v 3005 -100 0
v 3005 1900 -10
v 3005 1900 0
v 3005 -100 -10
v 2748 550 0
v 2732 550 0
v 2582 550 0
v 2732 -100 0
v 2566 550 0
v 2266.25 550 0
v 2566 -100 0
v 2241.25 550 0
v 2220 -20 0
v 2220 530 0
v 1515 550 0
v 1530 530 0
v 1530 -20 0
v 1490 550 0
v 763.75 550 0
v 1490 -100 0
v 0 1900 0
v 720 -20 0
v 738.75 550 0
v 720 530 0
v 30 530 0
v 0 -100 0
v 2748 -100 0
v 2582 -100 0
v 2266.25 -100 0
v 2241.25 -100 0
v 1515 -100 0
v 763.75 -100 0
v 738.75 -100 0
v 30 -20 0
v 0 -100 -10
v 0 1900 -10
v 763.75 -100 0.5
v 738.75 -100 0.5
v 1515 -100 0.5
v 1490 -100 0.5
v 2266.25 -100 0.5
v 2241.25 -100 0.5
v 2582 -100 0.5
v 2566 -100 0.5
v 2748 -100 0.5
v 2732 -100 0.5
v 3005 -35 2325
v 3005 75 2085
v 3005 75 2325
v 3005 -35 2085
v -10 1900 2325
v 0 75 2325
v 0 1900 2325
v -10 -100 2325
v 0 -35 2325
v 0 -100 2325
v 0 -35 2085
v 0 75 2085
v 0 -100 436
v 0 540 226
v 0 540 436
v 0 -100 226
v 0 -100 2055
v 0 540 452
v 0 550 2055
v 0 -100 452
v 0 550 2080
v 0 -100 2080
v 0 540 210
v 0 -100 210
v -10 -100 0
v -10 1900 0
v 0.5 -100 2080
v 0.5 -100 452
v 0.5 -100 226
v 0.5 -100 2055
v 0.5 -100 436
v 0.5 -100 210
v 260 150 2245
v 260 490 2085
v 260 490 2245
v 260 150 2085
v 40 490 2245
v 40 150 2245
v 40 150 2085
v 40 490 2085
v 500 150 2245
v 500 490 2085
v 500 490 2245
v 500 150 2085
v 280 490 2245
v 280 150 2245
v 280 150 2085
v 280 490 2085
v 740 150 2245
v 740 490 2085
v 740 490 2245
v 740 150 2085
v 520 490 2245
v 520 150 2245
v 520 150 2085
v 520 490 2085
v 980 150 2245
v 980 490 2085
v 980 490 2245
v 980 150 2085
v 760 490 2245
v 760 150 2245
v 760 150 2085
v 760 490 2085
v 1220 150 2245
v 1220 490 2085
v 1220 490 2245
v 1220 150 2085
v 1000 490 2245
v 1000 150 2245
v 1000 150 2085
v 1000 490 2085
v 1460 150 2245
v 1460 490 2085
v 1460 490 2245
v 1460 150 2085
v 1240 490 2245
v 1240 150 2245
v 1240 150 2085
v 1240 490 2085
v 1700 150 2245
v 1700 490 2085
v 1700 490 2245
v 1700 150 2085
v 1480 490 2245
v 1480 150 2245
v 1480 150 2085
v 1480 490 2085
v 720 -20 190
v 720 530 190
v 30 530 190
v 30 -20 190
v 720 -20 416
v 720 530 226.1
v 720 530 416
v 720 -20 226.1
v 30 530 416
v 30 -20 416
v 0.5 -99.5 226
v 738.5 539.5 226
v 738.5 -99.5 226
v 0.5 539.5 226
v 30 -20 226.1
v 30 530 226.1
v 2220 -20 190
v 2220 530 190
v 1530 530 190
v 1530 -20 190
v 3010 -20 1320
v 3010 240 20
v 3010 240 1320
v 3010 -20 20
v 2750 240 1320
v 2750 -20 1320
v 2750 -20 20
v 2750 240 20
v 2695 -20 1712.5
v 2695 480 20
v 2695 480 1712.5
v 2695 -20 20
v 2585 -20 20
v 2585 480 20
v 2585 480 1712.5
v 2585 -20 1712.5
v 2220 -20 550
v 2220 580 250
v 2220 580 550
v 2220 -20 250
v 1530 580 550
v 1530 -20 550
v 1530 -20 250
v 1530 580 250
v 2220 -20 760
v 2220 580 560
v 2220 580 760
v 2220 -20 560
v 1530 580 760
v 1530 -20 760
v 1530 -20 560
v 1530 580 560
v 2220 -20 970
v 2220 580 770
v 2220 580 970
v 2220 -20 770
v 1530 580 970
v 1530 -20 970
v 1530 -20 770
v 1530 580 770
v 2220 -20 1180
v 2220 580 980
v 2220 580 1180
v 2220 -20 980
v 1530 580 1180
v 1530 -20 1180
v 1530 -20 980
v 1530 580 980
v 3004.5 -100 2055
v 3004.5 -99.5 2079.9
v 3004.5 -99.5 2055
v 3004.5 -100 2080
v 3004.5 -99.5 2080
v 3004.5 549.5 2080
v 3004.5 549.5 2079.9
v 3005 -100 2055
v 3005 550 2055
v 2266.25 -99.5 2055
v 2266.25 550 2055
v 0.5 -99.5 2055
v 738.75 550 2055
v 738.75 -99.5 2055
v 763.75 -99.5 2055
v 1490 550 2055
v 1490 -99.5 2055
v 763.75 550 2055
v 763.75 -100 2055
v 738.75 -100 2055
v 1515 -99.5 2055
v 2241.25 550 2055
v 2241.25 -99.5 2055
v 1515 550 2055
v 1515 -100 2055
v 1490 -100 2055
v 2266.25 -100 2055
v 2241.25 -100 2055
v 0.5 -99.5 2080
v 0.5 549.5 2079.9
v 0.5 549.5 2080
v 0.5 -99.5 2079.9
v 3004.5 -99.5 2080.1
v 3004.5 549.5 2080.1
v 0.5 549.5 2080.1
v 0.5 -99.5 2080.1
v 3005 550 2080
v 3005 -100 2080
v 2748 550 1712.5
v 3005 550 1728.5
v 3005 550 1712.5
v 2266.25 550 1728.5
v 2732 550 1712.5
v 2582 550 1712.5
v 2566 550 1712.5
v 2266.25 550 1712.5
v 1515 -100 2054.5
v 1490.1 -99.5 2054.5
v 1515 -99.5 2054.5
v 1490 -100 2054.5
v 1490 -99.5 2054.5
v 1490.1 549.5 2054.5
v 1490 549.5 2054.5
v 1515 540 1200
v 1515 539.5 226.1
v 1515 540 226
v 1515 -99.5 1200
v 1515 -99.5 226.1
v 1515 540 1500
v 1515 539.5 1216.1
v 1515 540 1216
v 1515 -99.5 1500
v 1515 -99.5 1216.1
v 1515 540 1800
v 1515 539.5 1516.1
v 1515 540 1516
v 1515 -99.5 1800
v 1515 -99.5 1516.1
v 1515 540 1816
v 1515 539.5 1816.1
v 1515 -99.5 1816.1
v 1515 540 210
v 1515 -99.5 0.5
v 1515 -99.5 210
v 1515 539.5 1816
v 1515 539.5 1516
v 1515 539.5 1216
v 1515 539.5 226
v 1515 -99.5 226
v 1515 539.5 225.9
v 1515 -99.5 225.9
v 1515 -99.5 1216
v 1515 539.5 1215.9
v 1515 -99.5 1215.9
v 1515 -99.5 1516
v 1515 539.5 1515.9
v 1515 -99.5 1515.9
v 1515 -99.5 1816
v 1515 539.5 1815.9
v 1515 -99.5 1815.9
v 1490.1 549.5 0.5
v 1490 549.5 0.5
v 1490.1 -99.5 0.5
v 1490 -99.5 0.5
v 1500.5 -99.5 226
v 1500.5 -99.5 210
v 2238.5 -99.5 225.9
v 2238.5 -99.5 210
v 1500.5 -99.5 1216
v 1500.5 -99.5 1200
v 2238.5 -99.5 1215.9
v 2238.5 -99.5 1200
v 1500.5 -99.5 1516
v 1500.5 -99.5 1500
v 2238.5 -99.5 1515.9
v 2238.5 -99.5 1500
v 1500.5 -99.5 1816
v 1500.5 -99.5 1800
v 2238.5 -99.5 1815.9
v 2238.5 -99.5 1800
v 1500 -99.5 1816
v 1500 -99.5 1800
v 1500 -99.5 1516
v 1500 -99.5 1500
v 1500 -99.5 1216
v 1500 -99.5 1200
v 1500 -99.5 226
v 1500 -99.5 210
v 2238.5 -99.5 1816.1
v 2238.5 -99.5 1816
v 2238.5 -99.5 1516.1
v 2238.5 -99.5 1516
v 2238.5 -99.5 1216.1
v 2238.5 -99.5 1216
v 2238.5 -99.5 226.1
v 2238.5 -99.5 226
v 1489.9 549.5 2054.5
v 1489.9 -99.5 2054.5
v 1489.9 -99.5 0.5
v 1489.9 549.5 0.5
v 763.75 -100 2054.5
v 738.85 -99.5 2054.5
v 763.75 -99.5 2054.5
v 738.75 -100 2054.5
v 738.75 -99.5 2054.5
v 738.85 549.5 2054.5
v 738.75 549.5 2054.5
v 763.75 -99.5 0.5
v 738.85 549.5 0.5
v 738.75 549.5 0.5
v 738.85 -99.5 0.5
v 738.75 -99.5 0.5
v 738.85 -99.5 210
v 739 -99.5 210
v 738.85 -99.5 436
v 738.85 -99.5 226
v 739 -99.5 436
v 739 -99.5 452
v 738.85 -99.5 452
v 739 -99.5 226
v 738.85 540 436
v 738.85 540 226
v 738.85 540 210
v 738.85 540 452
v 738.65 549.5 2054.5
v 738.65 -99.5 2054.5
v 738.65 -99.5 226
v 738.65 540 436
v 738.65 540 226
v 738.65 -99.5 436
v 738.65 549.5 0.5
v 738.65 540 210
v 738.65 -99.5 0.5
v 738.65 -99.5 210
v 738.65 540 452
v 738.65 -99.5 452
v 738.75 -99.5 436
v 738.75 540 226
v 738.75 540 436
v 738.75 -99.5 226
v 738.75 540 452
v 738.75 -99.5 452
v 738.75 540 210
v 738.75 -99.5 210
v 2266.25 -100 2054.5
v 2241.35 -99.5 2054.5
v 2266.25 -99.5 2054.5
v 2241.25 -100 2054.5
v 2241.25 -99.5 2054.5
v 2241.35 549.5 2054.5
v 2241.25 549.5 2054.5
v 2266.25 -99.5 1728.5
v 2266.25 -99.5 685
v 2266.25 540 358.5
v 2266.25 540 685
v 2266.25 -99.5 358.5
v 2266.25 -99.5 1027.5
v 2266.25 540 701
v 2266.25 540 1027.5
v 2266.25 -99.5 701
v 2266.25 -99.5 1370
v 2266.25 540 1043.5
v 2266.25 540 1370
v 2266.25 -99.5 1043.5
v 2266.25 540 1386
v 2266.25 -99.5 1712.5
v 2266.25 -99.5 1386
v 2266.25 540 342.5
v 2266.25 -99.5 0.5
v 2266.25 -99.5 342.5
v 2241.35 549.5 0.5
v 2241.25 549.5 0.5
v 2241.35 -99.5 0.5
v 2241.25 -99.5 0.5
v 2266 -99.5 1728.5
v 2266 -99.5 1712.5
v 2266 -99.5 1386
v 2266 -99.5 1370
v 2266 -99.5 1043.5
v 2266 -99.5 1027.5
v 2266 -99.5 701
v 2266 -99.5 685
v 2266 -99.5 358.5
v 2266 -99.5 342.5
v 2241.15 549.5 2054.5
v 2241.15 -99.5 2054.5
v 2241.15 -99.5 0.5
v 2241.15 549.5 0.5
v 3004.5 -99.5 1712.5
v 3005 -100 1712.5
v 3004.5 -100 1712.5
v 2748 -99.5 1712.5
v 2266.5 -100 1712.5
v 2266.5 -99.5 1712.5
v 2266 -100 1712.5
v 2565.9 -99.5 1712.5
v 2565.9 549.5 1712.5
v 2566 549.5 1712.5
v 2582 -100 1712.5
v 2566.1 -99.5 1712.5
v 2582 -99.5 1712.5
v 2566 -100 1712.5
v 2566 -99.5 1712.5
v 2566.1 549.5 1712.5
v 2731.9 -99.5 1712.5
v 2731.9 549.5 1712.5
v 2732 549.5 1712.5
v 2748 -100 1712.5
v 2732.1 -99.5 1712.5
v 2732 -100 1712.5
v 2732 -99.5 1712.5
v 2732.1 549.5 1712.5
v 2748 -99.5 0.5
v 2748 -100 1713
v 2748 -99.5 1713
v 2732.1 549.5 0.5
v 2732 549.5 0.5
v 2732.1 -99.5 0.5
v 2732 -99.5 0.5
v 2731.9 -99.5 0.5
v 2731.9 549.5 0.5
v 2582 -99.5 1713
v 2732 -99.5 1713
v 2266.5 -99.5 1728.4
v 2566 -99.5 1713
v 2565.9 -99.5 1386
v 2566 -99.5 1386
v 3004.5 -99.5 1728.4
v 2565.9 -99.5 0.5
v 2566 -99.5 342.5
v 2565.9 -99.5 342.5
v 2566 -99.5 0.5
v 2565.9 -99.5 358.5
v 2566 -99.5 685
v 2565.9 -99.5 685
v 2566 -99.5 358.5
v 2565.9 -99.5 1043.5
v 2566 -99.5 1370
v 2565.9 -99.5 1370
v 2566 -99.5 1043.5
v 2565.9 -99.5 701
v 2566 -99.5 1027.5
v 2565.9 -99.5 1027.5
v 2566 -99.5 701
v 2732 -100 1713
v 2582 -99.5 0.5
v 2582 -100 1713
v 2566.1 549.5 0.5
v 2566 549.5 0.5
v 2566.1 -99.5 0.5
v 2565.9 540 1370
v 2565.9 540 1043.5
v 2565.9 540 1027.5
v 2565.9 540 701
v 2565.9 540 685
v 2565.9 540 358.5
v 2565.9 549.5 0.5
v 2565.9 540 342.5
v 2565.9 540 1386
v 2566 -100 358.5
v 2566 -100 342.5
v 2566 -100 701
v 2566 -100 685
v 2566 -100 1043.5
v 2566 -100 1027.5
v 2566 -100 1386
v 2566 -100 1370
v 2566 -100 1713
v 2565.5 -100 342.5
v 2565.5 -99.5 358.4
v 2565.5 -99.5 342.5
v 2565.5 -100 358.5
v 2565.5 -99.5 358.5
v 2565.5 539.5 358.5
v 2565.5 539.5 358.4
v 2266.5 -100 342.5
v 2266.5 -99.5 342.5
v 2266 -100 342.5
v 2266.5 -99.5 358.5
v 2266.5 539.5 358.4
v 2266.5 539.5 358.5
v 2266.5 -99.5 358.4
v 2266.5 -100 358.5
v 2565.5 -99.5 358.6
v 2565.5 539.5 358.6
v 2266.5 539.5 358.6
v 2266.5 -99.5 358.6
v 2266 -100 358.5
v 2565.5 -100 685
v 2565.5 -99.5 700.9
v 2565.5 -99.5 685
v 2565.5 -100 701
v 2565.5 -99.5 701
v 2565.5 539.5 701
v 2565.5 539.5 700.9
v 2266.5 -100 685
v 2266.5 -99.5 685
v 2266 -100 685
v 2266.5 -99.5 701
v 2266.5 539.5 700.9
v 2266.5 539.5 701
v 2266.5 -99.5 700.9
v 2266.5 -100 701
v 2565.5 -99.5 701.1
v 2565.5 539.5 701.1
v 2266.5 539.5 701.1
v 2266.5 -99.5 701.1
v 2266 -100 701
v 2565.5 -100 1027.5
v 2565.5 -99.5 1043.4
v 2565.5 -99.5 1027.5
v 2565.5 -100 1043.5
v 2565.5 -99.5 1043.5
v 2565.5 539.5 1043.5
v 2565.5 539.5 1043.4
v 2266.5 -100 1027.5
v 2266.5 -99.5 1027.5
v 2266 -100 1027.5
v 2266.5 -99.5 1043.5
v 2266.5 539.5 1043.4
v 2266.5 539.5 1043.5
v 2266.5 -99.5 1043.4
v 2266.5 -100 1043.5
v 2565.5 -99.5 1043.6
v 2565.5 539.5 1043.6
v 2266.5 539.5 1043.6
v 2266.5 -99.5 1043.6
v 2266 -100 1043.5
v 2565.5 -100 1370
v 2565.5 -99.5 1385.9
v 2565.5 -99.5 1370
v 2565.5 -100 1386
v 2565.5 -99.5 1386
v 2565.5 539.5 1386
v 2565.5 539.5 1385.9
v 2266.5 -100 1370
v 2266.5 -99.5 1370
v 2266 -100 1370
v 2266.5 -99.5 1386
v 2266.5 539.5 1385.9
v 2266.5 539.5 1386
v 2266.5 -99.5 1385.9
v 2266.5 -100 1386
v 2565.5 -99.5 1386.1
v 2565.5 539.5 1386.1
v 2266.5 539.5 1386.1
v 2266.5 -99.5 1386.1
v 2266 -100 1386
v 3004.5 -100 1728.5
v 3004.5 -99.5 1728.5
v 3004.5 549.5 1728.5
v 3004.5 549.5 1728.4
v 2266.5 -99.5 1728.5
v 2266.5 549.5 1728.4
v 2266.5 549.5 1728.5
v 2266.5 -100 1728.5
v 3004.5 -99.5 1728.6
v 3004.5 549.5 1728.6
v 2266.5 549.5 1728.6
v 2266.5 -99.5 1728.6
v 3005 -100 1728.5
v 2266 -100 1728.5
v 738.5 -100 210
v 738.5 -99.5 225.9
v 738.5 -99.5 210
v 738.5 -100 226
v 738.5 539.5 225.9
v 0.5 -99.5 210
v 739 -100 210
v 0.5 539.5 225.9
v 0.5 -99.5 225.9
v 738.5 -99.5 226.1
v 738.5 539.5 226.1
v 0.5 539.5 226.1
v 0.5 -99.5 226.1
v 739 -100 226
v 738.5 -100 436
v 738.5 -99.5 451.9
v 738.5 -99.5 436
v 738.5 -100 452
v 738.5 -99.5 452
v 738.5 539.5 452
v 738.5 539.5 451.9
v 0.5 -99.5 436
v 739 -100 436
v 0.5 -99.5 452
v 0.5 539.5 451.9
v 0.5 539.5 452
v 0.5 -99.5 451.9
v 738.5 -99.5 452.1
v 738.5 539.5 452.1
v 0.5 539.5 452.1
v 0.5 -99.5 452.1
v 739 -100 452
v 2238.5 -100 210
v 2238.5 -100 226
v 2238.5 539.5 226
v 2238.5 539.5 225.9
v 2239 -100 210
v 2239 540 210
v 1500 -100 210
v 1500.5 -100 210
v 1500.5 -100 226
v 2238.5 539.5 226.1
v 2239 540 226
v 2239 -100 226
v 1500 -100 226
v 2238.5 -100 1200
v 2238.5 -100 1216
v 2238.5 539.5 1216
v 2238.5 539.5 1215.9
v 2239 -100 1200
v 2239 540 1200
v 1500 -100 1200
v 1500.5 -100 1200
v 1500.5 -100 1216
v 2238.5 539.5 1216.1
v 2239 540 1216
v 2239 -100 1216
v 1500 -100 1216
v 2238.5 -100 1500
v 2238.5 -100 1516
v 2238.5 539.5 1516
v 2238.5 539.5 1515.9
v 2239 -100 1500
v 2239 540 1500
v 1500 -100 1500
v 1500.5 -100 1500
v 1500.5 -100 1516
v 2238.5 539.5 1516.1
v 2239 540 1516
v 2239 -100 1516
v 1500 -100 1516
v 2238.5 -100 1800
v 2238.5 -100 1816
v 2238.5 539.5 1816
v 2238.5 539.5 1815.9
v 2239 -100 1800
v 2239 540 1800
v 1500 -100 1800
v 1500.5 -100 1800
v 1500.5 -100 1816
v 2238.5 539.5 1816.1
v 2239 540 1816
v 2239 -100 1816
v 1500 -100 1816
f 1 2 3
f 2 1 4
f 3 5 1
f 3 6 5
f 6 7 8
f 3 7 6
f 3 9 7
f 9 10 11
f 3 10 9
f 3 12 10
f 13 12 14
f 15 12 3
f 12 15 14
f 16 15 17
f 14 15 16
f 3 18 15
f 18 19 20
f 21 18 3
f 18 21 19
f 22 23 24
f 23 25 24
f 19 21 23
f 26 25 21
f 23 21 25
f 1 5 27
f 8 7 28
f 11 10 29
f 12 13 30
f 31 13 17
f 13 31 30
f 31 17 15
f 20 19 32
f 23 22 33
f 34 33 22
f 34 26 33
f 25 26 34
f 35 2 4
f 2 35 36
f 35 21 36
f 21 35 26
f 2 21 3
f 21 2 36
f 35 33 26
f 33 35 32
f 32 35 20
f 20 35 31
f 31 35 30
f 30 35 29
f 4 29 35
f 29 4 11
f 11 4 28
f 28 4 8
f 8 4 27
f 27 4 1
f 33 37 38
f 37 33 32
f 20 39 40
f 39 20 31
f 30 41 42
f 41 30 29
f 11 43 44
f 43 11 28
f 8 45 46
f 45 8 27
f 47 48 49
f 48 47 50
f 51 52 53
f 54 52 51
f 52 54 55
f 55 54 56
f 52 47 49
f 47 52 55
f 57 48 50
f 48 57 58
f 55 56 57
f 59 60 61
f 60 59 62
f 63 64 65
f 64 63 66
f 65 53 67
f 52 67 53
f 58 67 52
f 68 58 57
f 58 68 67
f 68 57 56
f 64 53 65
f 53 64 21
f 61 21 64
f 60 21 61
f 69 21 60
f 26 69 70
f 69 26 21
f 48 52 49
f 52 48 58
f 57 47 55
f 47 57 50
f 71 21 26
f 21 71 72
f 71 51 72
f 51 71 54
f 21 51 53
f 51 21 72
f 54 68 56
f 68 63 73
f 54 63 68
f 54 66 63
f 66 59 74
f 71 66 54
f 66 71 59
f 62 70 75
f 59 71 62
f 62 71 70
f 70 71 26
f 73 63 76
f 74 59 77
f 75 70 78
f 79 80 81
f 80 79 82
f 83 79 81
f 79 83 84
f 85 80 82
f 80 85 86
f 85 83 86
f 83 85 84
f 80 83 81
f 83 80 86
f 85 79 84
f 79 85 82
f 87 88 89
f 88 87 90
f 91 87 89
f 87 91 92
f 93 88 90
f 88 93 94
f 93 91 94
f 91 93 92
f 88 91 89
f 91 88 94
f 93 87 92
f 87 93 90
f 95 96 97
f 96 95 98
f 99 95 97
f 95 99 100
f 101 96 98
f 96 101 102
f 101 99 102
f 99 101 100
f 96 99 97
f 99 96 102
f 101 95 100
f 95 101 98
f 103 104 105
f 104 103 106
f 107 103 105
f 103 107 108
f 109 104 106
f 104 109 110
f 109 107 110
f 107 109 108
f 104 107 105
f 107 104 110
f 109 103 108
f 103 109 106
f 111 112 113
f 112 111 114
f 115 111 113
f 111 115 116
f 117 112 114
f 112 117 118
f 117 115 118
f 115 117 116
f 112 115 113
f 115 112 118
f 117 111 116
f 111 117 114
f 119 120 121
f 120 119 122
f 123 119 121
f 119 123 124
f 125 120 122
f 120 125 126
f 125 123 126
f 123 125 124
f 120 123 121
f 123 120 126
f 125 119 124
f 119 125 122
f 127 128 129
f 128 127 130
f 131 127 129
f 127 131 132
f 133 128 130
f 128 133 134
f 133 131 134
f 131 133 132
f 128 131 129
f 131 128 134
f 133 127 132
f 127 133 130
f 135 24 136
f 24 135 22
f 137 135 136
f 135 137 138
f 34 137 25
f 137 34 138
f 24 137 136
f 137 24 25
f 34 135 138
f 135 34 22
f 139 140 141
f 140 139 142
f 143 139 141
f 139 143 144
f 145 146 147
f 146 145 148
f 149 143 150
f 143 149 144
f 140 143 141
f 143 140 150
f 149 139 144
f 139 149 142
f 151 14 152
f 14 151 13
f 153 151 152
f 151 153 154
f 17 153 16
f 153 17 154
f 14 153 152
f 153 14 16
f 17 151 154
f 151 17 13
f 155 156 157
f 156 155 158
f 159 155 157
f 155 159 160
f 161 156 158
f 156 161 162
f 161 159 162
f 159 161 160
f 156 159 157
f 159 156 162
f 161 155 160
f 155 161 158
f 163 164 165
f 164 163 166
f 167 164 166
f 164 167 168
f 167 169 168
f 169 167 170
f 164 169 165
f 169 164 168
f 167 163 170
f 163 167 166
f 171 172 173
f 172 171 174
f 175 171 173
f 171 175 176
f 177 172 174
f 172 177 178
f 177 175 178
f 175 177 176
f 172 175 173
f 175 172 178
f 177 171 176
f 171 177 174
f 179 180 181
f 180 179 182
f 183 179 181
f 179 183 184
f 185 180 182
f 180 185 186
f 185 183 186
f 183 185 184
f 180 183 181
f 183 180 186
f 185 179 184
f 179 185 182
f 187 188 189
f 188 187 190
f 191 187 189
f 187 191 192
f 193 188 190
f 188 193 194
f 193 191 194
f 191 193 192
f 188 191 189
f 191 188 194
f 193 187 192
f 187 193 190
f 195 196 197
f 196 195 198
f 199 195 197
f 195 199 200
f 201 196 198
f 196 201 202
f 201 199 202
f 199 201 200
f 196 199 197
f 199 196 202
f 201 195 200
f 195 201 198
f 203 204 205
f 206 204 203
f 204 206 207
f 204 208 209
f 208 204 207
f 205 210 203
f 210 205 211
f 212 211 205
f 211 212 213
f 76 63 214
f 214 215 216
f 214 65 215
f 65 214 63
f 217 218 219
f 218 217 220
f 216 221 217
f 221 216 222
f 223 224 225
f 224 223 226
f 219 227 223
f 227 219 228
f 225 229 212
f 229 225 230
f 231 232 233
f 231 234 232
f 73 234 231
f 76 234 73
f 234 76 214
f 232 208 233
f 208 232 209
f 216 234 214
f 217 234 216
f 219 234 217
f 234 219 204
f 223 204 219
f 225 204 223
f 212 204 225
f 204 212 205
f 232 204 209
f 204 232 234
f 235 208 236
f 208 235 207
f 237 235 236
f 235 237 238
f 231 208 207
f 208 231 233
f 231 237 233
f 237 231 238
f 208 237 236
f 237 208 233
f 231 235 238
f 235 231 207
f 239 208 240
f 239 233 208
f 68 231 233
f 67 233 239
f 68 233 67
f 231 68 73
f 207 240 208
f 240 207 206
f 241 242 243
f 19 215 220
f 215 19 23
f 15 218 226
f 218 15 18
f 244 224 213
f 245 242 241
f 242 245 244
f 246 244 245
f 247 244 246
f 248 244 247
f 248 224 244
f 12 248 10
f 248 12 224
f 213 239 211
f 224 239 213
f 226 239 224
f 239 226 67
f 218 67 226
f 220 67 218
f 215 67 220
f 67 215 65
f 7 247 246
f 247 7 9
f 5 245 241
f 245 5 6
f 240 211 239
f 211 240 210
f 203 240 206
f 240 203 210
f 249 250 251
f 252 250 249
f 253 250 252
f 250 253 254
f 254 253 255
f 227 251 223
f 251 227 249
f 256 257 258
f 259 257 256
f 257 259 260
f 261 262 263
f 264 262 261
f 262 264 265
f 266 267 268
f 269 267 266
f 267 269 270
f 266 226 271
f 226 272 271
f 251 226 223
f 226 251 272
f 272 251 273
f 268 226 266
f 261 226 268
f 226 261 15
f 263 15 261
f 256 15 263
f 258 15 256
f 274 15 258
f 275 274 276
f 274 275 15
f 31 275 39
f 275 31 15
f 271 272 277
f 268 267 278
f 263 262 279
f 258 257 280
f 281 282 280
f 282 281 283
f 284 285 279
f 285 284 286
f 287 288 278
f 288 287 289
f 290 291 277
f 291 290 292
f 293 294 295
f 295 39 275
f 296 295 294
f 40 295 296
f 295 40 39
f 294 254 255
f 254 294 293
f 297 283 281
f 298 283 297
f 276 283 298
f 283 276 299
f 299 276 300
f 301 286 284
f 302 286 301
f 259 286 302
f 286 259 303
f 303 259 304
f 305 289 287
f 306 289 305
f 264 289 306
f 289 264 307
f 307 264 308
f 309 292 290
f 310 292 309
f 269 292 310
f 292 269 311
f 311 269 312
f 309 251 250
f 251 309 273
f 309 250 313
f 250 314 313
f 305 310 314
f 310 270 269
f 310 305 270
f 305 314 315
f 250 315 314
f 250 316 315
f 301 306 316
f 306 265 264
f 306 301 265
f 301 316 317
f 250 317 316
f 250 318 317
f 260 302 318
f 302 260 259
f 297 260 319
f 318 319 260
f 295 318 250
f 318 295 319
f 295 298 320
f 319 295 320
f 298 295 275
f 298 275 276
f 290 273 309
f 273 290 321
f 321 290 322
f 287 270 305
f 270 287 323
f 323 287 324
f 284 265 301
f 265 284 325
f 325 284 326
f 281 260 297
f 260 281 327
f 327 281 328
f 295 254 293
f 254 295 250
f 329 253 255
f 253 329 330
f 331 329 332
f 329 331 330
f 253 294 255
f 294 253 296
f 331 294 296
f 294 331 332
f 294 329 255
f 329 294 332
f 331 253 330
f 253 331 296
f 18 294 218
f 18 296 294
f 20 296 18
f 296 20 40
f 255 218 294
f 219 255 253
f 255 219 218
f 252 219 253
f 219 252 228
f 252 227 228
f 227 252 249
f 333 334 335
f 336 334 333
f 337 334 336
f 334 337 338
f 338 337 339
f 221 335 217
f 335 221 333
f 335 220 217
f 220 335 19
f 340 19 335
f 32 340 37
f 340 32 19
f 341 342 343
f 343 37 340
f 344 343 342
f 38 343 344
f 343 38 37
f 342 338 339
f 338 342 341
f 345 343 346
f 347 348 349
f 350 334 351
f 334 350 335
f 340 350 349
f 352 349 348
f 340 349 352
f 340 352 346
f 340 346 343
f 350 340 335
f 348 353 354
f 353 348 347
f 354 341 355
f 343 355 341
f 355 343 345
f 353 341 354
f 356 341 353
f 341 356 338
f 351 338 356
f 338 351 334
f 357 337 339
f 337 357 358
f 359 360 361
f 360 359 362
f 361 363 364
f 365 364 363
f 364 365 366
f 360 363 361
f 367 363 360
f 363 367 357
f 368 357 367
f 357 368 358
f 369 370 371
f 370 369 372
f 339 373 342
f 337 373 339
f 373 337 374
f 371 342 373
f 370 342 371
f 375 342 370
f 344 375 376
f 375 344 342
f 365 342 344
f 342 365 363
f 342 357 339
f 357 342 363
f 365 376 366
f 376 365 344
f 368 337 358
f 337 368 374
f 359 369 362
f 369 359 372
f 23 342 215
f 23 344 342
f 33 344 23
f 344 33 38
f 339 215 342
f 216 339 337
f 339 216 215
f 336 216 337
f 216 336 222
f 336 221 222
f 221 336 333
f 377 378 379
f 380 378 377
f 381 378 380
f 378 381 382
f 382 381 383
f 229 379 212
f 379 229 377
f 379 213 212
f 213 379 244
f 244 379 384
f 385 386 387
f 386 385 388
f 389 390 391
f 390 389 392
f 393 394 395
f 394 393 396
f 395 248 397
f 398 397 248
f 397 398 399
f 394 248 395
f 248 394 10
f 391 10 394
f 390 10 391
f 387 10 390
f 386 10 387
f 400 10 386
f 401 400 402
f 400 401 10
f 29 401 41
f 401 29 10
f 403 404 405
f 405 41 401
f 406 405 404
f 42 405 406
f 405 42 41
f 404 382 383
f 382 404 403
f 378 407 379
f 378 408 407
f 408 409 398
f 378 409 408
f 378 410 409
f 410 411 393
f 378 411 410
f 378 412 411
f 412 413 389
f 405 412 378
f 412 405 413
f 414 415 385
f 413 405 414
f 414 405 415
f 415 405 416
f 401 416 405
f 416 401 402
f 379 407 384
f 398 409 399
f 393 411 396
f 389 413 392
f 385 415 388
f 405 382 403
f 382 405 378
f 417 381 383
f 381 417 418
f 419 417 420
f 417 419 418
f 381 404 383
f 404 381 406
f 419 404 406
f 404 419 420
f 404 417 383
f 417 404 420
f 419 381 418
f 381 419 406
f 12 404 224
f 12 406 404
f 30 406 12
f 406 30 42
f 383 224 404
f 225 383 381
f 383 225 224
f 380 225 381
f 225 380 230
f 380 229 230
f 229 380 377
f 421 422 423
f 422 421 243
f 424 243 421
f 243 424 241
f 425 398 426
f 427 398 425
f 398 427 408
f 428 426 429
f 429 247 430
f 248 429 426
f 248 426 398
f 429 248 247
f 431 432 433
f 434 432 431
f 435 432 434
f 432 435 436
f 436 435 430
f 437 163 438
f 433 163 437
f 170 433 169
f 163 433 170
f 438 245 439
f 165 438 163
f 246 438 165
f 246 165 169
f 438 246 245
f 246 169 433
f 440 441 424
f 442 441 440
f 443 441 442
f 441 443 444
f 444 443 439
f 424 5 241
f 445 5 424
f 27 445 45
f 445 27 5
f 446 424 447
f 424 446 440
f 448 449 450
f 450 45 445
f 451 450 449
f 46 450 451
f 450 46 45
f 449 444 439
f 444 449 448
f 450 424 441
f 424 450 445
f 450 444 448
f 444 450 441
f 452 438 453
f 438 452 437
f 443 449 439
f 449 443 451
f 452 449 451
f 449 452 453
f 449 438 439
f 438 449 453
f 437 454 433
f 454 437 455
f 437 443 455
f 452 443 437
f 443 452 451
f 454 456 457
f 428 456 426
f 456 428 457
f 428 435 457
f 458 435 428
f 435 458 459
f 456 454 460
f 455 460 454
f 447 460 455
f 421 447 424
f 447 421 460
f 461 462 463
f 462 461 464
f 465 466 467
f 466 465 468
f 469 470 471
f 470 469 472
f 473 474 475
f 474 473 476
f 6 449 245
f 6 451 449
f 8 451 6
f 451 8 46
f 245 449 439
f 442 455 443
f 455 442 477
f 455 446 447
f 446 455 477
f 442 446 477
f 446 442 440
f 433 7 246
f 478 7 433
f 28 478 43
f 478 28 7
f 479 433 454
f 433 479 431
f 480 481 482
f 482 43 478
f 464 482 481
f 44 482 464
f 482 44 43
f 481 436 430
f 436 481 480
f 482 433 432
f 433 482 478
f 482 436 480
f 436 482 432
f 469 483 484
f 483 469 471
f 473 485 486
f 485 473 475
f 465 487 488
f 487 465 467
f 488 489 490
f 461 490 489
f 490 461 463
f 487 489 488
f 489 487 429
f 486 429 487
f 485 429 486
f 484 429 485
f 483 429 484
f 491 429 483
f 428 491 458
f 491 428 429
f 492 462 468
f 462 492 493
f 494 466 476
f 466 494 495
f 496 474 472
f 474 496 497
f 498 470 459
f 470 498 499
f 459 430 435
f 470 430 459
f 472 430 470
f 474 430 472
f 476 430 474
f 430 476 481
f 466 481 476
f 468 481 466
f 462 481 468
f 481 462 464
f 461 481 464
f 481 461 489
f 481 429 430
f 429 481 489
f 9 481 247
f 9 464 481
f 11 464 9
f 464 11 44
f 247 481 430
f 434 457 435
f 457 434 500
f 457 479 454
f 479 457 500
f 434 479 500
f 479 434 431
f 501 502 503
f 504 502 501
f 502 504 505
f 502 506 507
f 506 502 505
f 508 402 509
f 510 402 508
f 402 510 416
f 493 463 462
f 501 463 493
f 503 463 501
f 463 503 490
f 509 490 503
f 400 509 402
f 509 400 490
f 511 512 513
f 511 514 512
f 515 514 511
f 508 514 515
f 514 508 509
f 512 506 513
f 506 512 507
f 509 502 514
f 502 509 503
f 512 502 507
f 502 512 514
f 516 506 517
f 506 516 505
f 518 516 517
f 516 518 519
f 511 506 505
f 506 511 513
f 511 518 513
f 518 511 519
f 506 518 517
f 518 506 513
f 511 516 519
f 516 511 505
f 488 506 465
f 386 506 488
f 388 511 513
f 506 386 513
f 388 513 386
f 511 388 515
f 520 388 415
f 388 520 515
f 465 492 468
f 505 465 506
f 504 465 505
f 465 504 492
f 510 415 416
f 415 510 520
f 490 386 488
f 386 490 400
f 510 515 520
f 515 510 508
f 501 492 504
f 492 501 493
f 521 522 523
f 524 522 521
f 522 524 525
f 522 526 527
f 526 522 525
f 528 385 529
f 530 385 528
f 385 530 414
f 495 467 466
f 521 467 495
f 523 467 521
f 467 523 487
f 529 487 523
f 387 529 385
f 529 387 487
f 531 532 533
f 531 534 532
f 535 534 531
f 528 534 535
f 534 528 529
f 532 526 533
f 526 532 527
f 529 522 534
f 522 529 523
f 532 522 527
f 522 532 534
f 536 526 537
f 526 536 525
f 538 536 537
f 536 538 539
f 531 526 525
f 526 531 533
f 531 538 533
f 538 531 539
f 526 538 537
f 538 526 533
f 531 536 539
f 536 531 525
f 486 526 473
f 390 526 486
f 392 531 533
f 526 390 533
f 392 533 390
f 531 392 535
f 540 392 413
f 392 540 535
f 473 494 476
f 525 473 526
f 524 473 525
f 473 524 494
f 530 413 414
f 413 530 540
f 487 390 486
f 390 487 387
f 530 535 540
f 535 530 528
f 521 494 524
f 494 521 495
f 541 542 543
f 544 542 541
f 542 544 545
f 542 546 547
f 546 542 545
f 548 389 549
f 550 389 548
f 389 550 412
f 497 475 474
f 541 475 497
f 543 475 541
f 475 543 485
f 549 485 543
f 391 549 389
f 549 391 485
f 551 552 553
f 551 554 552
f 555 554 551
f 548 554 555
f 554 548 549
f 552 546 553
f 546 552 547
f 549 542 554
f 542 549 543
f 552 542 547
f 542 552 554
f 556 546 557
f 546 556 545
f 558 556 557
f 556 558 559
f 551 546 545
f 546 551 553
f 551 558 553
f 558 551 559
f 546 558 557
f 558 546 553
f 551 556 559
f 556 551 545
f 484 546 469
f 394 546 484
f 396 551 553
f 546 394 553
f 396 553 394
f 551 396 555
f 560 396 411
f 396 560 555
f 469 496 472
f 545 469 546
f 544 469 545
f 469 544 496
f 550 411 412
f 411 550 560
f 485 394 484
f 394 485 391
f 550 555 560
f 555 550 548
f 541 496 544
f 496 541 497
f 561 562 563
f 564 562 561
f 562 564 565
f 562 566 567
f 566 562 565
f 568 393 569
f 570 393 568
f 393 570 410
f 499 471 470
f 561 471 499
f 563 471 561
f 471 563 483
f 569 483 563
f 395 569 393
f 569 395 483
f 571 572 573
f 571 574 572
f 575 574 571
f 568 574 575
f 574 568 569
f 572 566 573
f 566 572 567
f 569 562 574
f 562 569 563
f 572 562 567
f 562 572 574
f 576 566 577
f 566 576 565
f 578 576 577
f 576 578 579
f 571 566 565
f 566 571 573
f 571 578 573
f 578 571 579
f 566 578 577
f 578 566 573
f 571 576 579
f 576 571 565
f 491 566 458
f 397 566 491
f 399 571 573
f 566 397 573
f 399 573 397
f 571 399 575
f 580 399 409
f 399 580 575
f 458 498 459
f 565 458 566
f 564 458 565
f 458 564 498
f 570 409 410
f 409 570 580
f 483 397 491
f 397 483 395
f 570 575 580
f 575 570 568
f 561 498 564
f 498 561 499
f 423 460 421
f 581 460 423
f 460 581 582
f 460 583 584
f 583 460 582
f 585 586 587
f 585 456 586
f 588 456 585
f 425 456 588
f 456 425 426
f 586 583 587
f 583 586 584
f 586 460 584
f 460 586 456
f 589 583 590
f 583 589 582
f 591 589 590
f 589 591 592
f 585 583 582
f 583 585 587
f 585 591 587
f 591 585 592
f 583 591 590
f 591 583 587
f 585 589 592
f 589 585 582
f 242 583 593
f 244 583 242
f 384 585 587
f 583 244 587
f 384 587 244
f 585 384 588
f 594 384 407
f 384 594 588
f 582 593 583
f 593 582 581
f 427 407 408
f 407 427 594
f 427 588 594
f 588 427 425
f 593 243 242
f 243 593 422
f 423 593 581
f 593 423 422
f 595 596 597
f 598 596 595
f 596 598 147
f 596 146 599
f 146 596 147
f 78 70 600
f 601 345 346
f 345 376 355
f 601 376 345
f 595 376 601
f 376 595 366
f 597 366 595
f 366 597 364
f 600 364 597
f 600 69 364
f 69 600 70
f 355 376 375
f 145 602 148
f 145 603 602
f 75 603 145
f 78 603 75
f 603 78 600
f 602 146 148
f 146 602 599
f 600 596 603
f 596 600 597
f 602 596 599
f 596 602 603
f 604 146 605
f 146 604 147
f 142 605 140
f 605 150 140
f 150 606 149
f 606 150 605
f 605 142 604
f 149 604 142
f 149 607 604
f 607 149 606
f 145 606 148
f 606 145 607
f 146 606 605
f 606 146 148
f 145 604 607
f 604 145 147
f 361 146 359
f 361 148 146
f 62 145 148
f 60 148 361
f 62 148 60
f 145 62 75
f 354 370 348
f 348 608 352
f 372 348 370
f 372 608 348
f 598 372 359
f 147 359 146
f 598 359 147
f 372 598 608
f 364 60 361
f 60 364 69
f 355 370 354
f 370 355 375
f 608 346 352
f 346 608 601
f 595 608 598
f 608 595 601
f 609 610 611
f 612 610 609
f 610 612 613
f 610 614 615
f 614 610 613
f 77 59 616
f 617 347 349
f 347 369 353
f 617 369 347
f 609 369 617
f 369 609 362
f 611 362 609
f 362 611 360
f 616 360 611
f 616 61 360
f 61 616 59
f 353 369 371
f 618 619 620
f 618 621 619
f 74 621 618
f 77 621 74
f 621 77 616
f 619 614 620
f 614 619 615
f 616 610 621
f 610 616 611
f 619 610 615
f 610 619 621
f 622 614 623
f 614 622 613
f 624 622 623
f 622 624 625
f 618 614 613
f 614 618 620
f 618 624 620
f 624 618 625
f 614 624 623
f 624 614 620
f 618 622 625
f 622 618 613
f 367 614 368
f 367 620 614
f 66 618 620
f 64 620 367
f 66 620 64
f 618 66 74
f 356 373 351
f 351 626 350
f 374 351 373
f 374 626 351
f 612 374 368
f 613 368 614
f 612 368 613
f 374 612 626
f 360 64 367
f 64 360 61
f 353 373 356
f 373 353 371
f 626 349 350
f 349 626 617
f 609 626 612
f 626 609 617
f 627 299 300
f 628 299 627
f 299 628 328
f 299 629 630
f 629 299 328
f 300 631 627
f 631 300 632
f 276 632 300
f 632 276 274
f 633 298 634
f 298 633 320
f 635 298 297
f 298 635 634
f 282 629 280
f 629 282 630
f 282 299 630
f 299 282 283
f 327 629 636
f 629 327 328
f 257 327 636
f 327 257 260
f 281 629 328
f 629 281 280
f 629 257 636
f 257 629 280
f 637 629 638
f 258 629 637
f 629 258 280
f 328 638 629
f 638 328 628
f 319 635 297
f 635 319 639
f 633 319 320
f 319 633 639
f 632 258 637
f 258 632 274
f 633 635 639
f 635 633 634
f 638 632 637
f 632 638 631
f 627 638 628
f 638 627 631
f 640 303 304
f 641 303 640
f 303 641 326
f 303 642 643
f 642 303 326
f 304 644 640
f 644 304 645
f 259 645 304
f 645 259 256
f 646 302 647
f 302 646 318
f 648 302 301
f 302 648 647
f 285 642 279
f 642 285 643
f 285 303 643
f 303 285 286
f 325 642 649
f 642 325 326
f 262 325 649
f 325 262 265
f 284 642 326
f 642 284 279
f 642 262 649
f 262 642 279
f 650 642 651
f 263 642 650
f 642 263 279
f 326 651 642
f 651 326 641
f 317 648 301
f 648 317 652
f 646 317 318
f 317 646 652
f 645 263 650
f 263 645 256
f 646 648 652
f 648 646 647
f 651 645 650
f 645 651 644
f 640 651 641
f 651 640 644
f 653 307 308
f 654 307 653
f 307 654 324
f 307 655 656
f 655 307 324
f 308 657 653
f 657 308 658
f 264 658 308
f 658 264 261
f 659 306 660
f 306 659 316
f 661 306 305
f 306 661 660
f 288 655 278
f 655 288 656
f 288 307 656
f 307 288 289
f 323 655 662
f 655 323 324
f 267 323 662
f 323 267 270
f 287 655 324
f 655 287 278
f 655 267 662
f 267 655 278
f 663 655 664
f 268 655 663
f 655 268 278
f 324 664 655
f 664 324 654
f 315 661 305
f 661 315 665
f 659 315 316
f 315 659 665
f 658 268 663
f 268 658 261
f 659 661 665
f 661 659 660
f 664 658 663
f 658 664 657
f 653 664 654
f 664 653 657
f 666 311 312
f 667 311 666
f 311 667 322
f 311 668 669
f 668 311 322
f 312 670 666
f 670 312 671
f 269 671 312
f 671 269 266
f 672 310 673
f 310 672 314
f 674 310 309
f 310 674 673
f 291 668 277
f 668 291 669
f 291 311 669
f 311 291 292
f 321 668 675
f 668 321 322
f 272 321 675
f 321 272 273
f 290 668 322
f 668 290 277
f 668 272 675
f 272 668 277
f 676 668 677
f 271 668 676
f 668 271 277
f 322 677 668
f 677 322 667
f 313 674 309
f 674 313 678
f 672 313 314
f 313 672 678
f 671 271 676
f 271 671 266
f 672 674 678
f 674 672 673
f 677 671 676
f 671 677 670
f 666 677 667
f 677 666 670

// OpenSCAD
ROOM_WITH = 3005;
ROOM_HEIGTH = 2325;
BACK_OFFSET = 100;
COUPE_DEPTH = 550;
RACK_HEIGHT = 2085-25-5;

//cube([150, 50, 16]);

room();
boxes();
boxes2();

translate([0,-BACK_OFFSET,RACK_HEIGHT]) sheet(ROOM_WITH, COUPE_DEPTH+BACK_OFFSET, 25, [true, true, 0, true]);
racks();

translate([ROOM_WITH-439,0,0]) shelfs(300, 540);
translate([ROOM_WITH,0,0])  translate([-739,-BACK_OFFSET,RACK_HEIGHT*5/6]) sheet(739, 550+BACK_OFFSET, 16, [true, true, 0, true]);

translate([739,0,0]) shelfs2(739, 540);



module racks() {
    translate([ROOM_WITH*0.5 + 12.5,-BACK_OFFSET,0]) rotate([0,-90,0]) sheet(RACK_HEIGHT, COUPE_DEPTH+BACK_OFFSET, 25, [true, true, 0, true]);
    translate([ROOM_WITH*0.25 + 12.5,-BACK_OFFSET,0]) rotate([0,-90,0]) sheet(RACK_HEIGHT, COUPE_DEPTH+BACK_OFFSET, 25, [true, true, 0, true]);
    translate([ROOM_WITH*0.75 + 12.5,-BACK_OFFSET,0]) rotate([0,-90,0]) sheet(RACK_HEIGHT, COUPE_DEPTH+BACK_OFFSET, 25, [true, true, 0, true]);
    translate([ROOM_WITH-439+16+150+16,-BACK_OFFSET,0]) rotate([0,-90,0]) sheet(1713, COUPE_DEPTH+BACK_OFFSET, 16, [true, true, 0, true]);
    translate([ROOM_WITH-439+16,-BACK_OFFSET,0]) rotate([0,-90,0]) sheet(1713, COUPE_DEPTH+BACK_OFFSET, 16, [true, true, 0, true]);
}

module shelfs(width, depth) {
    translate([-width,-BACK_OFFSET,RACK_HEIGHT*1/6]) sheet(width, depth+BACK_OFFSET, 16, [true, true, 0, true]);
    translate([-width,-BACK_OFFSET,RACK_HEIGHT*2/6]) sheet(width, depth+BACK_OFFSET, 16, [true, true, 0, true]);
    translate([-width,-BACK_OFFSET,RACK_HEIGHT*3/6]) sheet(width, depth+BACK_OFFSET, 16, [true, true, 0, true]);
    translate([-width,-BACK_OFFSET,RACK_HEIGHT*4/6]) sheet(width, depth+BACK_OFFSET, 16, [true, true, 0, true]);
}

module shelfs2(width, depth) {
    translate([-width,-BACK_OFFSET,210]) sheet(width, depth+BACK_OFFSET, 16, [true, true, 0, true]);
    translate([-width,-BACK_OFFSET,210+16+190+20]) sheet(width, depth+BACK_OFFSET, 16, [true, true, 0, true]);

    translate([1500-width,-BACK_OFFSET,210]) sheet(width, depth+BACK_OFFSET, 16, [true, true, 0, true]);
    translate([1500-width,-BACK_OFFSET,1200]) sheet(width, depth+BACK_OFFSET, 16, [true, true, 0, true]);

    translate([1500-width,-BACK_OFFSET,1500]) sheet(width, depth+BACK_OFFSET, 16, [true, true, 0, true]);
    translate([1500-width,-BACK_OFFSET,1800]) sheet(width, depth+BACK_OFFSET, 16, [true, true, 0, true]);
}



module boxes2(width) {

    color("Blue") {
        translate([1530, -20, 250]) cube([690,600,300]);
        translate([1530, -20, 250+10+300]) cube([690,600,200]);
        translate([1530, -20, 250+10+300+10+200]) cube([690,600,200]);
        translate([1530, -20, 250+10+300+10+200+10+200]) cube([690,600,200]);
        
    }

}

module boxes() {

    color("Pink") {
        translate([40 + 240*0, 150,RACK_HEIGHT+30]) cube([220, 340, 160]);
        translate([40 + 240*1, 150,RACK_HEIGHT+30]) cube([220, 340, 160]);
        translate([40 + 240*2, 150,RACK_HEIGHT+30]) cube([220, 340, 160]);
        translate([40 + 240*3, 150,RACK_HEIGHT+30]) cube([220, 340, 160]);
        translate([40 + 240*4, 150,RACK_HEIGHT+30]) cube([220, 340, 160]);
        translate([40 + 240*5, 150,RACK_HEIGHT+30]) cube([220, 340, 160]);
        translate([40 + 240*6, 150,RACK_HEIGHT+30]) cube([220, 340, 160]);
        //translate([0, 50,RACK_HEIGHT+40]) cube([930, 550, 190]);
        translate([30, -20, 0]) cube([690,550,190]);
        translate([30, -20, 210+16]) cube([690,550,190]);

        translate([1530, -20, 0]) cube([690,550,190]);

        translate([2750, -20, 20]) cube([260,260,1300]);
        translate([2585, -20, 20]) cube([110,500,1700]);
    }

}

module room() {
    //translate([ROOM_WITH,-BACK_OFFSET,0]) color("WhiteSmoke") cube([10,2000,ROOM_HEIGTH]);
    //translate([0,-50,ROOM_HEIGTH]) color("White") cube([ROOM_WITH,2000,10]);
    translate([0,-BACK_OFFSET,-10]) color("Gray") cube([ROOM_WITH,2000,10]);
    translate([0,440-475,2085]) color("White") cube([ROOM_WITH,110,240]);
    translate([-10,-BACK_OFFSET,0]) color("Teal") cube([10,2000,ROOM_HEIGTH]);
}

module sheet(length, width, thickness, edging) {
    
    translate([0.5,0.5,0]) {
        color("White") cube([length-1, width-1, 0.1]);
        translate([0,0,0.1]) color("Green") cube([length-1, width-1, thickness-0.2]);
        translate([0,0,thickness]) color("White") cube([length-1, width-1, 0.1]);
    }
    if (edging[0]) color("White") cube([0.5, width, thickness]);
    if (edging[1]) translate([length-0.5,0,0]) color("White") cube([0.5, width, thickness]);
    if (edging[2]) color("White") cube([length, 0.5, thickness]);
    if (edging[3]) translate([0,width-0.5,0]) color("White") cube([length, 0.5, thickness]);
        
    translate([10,10,thickness]) rotate([0,0,0]) #text(str(length, " x ", width, " x ", thickness), size=30);
    
}
